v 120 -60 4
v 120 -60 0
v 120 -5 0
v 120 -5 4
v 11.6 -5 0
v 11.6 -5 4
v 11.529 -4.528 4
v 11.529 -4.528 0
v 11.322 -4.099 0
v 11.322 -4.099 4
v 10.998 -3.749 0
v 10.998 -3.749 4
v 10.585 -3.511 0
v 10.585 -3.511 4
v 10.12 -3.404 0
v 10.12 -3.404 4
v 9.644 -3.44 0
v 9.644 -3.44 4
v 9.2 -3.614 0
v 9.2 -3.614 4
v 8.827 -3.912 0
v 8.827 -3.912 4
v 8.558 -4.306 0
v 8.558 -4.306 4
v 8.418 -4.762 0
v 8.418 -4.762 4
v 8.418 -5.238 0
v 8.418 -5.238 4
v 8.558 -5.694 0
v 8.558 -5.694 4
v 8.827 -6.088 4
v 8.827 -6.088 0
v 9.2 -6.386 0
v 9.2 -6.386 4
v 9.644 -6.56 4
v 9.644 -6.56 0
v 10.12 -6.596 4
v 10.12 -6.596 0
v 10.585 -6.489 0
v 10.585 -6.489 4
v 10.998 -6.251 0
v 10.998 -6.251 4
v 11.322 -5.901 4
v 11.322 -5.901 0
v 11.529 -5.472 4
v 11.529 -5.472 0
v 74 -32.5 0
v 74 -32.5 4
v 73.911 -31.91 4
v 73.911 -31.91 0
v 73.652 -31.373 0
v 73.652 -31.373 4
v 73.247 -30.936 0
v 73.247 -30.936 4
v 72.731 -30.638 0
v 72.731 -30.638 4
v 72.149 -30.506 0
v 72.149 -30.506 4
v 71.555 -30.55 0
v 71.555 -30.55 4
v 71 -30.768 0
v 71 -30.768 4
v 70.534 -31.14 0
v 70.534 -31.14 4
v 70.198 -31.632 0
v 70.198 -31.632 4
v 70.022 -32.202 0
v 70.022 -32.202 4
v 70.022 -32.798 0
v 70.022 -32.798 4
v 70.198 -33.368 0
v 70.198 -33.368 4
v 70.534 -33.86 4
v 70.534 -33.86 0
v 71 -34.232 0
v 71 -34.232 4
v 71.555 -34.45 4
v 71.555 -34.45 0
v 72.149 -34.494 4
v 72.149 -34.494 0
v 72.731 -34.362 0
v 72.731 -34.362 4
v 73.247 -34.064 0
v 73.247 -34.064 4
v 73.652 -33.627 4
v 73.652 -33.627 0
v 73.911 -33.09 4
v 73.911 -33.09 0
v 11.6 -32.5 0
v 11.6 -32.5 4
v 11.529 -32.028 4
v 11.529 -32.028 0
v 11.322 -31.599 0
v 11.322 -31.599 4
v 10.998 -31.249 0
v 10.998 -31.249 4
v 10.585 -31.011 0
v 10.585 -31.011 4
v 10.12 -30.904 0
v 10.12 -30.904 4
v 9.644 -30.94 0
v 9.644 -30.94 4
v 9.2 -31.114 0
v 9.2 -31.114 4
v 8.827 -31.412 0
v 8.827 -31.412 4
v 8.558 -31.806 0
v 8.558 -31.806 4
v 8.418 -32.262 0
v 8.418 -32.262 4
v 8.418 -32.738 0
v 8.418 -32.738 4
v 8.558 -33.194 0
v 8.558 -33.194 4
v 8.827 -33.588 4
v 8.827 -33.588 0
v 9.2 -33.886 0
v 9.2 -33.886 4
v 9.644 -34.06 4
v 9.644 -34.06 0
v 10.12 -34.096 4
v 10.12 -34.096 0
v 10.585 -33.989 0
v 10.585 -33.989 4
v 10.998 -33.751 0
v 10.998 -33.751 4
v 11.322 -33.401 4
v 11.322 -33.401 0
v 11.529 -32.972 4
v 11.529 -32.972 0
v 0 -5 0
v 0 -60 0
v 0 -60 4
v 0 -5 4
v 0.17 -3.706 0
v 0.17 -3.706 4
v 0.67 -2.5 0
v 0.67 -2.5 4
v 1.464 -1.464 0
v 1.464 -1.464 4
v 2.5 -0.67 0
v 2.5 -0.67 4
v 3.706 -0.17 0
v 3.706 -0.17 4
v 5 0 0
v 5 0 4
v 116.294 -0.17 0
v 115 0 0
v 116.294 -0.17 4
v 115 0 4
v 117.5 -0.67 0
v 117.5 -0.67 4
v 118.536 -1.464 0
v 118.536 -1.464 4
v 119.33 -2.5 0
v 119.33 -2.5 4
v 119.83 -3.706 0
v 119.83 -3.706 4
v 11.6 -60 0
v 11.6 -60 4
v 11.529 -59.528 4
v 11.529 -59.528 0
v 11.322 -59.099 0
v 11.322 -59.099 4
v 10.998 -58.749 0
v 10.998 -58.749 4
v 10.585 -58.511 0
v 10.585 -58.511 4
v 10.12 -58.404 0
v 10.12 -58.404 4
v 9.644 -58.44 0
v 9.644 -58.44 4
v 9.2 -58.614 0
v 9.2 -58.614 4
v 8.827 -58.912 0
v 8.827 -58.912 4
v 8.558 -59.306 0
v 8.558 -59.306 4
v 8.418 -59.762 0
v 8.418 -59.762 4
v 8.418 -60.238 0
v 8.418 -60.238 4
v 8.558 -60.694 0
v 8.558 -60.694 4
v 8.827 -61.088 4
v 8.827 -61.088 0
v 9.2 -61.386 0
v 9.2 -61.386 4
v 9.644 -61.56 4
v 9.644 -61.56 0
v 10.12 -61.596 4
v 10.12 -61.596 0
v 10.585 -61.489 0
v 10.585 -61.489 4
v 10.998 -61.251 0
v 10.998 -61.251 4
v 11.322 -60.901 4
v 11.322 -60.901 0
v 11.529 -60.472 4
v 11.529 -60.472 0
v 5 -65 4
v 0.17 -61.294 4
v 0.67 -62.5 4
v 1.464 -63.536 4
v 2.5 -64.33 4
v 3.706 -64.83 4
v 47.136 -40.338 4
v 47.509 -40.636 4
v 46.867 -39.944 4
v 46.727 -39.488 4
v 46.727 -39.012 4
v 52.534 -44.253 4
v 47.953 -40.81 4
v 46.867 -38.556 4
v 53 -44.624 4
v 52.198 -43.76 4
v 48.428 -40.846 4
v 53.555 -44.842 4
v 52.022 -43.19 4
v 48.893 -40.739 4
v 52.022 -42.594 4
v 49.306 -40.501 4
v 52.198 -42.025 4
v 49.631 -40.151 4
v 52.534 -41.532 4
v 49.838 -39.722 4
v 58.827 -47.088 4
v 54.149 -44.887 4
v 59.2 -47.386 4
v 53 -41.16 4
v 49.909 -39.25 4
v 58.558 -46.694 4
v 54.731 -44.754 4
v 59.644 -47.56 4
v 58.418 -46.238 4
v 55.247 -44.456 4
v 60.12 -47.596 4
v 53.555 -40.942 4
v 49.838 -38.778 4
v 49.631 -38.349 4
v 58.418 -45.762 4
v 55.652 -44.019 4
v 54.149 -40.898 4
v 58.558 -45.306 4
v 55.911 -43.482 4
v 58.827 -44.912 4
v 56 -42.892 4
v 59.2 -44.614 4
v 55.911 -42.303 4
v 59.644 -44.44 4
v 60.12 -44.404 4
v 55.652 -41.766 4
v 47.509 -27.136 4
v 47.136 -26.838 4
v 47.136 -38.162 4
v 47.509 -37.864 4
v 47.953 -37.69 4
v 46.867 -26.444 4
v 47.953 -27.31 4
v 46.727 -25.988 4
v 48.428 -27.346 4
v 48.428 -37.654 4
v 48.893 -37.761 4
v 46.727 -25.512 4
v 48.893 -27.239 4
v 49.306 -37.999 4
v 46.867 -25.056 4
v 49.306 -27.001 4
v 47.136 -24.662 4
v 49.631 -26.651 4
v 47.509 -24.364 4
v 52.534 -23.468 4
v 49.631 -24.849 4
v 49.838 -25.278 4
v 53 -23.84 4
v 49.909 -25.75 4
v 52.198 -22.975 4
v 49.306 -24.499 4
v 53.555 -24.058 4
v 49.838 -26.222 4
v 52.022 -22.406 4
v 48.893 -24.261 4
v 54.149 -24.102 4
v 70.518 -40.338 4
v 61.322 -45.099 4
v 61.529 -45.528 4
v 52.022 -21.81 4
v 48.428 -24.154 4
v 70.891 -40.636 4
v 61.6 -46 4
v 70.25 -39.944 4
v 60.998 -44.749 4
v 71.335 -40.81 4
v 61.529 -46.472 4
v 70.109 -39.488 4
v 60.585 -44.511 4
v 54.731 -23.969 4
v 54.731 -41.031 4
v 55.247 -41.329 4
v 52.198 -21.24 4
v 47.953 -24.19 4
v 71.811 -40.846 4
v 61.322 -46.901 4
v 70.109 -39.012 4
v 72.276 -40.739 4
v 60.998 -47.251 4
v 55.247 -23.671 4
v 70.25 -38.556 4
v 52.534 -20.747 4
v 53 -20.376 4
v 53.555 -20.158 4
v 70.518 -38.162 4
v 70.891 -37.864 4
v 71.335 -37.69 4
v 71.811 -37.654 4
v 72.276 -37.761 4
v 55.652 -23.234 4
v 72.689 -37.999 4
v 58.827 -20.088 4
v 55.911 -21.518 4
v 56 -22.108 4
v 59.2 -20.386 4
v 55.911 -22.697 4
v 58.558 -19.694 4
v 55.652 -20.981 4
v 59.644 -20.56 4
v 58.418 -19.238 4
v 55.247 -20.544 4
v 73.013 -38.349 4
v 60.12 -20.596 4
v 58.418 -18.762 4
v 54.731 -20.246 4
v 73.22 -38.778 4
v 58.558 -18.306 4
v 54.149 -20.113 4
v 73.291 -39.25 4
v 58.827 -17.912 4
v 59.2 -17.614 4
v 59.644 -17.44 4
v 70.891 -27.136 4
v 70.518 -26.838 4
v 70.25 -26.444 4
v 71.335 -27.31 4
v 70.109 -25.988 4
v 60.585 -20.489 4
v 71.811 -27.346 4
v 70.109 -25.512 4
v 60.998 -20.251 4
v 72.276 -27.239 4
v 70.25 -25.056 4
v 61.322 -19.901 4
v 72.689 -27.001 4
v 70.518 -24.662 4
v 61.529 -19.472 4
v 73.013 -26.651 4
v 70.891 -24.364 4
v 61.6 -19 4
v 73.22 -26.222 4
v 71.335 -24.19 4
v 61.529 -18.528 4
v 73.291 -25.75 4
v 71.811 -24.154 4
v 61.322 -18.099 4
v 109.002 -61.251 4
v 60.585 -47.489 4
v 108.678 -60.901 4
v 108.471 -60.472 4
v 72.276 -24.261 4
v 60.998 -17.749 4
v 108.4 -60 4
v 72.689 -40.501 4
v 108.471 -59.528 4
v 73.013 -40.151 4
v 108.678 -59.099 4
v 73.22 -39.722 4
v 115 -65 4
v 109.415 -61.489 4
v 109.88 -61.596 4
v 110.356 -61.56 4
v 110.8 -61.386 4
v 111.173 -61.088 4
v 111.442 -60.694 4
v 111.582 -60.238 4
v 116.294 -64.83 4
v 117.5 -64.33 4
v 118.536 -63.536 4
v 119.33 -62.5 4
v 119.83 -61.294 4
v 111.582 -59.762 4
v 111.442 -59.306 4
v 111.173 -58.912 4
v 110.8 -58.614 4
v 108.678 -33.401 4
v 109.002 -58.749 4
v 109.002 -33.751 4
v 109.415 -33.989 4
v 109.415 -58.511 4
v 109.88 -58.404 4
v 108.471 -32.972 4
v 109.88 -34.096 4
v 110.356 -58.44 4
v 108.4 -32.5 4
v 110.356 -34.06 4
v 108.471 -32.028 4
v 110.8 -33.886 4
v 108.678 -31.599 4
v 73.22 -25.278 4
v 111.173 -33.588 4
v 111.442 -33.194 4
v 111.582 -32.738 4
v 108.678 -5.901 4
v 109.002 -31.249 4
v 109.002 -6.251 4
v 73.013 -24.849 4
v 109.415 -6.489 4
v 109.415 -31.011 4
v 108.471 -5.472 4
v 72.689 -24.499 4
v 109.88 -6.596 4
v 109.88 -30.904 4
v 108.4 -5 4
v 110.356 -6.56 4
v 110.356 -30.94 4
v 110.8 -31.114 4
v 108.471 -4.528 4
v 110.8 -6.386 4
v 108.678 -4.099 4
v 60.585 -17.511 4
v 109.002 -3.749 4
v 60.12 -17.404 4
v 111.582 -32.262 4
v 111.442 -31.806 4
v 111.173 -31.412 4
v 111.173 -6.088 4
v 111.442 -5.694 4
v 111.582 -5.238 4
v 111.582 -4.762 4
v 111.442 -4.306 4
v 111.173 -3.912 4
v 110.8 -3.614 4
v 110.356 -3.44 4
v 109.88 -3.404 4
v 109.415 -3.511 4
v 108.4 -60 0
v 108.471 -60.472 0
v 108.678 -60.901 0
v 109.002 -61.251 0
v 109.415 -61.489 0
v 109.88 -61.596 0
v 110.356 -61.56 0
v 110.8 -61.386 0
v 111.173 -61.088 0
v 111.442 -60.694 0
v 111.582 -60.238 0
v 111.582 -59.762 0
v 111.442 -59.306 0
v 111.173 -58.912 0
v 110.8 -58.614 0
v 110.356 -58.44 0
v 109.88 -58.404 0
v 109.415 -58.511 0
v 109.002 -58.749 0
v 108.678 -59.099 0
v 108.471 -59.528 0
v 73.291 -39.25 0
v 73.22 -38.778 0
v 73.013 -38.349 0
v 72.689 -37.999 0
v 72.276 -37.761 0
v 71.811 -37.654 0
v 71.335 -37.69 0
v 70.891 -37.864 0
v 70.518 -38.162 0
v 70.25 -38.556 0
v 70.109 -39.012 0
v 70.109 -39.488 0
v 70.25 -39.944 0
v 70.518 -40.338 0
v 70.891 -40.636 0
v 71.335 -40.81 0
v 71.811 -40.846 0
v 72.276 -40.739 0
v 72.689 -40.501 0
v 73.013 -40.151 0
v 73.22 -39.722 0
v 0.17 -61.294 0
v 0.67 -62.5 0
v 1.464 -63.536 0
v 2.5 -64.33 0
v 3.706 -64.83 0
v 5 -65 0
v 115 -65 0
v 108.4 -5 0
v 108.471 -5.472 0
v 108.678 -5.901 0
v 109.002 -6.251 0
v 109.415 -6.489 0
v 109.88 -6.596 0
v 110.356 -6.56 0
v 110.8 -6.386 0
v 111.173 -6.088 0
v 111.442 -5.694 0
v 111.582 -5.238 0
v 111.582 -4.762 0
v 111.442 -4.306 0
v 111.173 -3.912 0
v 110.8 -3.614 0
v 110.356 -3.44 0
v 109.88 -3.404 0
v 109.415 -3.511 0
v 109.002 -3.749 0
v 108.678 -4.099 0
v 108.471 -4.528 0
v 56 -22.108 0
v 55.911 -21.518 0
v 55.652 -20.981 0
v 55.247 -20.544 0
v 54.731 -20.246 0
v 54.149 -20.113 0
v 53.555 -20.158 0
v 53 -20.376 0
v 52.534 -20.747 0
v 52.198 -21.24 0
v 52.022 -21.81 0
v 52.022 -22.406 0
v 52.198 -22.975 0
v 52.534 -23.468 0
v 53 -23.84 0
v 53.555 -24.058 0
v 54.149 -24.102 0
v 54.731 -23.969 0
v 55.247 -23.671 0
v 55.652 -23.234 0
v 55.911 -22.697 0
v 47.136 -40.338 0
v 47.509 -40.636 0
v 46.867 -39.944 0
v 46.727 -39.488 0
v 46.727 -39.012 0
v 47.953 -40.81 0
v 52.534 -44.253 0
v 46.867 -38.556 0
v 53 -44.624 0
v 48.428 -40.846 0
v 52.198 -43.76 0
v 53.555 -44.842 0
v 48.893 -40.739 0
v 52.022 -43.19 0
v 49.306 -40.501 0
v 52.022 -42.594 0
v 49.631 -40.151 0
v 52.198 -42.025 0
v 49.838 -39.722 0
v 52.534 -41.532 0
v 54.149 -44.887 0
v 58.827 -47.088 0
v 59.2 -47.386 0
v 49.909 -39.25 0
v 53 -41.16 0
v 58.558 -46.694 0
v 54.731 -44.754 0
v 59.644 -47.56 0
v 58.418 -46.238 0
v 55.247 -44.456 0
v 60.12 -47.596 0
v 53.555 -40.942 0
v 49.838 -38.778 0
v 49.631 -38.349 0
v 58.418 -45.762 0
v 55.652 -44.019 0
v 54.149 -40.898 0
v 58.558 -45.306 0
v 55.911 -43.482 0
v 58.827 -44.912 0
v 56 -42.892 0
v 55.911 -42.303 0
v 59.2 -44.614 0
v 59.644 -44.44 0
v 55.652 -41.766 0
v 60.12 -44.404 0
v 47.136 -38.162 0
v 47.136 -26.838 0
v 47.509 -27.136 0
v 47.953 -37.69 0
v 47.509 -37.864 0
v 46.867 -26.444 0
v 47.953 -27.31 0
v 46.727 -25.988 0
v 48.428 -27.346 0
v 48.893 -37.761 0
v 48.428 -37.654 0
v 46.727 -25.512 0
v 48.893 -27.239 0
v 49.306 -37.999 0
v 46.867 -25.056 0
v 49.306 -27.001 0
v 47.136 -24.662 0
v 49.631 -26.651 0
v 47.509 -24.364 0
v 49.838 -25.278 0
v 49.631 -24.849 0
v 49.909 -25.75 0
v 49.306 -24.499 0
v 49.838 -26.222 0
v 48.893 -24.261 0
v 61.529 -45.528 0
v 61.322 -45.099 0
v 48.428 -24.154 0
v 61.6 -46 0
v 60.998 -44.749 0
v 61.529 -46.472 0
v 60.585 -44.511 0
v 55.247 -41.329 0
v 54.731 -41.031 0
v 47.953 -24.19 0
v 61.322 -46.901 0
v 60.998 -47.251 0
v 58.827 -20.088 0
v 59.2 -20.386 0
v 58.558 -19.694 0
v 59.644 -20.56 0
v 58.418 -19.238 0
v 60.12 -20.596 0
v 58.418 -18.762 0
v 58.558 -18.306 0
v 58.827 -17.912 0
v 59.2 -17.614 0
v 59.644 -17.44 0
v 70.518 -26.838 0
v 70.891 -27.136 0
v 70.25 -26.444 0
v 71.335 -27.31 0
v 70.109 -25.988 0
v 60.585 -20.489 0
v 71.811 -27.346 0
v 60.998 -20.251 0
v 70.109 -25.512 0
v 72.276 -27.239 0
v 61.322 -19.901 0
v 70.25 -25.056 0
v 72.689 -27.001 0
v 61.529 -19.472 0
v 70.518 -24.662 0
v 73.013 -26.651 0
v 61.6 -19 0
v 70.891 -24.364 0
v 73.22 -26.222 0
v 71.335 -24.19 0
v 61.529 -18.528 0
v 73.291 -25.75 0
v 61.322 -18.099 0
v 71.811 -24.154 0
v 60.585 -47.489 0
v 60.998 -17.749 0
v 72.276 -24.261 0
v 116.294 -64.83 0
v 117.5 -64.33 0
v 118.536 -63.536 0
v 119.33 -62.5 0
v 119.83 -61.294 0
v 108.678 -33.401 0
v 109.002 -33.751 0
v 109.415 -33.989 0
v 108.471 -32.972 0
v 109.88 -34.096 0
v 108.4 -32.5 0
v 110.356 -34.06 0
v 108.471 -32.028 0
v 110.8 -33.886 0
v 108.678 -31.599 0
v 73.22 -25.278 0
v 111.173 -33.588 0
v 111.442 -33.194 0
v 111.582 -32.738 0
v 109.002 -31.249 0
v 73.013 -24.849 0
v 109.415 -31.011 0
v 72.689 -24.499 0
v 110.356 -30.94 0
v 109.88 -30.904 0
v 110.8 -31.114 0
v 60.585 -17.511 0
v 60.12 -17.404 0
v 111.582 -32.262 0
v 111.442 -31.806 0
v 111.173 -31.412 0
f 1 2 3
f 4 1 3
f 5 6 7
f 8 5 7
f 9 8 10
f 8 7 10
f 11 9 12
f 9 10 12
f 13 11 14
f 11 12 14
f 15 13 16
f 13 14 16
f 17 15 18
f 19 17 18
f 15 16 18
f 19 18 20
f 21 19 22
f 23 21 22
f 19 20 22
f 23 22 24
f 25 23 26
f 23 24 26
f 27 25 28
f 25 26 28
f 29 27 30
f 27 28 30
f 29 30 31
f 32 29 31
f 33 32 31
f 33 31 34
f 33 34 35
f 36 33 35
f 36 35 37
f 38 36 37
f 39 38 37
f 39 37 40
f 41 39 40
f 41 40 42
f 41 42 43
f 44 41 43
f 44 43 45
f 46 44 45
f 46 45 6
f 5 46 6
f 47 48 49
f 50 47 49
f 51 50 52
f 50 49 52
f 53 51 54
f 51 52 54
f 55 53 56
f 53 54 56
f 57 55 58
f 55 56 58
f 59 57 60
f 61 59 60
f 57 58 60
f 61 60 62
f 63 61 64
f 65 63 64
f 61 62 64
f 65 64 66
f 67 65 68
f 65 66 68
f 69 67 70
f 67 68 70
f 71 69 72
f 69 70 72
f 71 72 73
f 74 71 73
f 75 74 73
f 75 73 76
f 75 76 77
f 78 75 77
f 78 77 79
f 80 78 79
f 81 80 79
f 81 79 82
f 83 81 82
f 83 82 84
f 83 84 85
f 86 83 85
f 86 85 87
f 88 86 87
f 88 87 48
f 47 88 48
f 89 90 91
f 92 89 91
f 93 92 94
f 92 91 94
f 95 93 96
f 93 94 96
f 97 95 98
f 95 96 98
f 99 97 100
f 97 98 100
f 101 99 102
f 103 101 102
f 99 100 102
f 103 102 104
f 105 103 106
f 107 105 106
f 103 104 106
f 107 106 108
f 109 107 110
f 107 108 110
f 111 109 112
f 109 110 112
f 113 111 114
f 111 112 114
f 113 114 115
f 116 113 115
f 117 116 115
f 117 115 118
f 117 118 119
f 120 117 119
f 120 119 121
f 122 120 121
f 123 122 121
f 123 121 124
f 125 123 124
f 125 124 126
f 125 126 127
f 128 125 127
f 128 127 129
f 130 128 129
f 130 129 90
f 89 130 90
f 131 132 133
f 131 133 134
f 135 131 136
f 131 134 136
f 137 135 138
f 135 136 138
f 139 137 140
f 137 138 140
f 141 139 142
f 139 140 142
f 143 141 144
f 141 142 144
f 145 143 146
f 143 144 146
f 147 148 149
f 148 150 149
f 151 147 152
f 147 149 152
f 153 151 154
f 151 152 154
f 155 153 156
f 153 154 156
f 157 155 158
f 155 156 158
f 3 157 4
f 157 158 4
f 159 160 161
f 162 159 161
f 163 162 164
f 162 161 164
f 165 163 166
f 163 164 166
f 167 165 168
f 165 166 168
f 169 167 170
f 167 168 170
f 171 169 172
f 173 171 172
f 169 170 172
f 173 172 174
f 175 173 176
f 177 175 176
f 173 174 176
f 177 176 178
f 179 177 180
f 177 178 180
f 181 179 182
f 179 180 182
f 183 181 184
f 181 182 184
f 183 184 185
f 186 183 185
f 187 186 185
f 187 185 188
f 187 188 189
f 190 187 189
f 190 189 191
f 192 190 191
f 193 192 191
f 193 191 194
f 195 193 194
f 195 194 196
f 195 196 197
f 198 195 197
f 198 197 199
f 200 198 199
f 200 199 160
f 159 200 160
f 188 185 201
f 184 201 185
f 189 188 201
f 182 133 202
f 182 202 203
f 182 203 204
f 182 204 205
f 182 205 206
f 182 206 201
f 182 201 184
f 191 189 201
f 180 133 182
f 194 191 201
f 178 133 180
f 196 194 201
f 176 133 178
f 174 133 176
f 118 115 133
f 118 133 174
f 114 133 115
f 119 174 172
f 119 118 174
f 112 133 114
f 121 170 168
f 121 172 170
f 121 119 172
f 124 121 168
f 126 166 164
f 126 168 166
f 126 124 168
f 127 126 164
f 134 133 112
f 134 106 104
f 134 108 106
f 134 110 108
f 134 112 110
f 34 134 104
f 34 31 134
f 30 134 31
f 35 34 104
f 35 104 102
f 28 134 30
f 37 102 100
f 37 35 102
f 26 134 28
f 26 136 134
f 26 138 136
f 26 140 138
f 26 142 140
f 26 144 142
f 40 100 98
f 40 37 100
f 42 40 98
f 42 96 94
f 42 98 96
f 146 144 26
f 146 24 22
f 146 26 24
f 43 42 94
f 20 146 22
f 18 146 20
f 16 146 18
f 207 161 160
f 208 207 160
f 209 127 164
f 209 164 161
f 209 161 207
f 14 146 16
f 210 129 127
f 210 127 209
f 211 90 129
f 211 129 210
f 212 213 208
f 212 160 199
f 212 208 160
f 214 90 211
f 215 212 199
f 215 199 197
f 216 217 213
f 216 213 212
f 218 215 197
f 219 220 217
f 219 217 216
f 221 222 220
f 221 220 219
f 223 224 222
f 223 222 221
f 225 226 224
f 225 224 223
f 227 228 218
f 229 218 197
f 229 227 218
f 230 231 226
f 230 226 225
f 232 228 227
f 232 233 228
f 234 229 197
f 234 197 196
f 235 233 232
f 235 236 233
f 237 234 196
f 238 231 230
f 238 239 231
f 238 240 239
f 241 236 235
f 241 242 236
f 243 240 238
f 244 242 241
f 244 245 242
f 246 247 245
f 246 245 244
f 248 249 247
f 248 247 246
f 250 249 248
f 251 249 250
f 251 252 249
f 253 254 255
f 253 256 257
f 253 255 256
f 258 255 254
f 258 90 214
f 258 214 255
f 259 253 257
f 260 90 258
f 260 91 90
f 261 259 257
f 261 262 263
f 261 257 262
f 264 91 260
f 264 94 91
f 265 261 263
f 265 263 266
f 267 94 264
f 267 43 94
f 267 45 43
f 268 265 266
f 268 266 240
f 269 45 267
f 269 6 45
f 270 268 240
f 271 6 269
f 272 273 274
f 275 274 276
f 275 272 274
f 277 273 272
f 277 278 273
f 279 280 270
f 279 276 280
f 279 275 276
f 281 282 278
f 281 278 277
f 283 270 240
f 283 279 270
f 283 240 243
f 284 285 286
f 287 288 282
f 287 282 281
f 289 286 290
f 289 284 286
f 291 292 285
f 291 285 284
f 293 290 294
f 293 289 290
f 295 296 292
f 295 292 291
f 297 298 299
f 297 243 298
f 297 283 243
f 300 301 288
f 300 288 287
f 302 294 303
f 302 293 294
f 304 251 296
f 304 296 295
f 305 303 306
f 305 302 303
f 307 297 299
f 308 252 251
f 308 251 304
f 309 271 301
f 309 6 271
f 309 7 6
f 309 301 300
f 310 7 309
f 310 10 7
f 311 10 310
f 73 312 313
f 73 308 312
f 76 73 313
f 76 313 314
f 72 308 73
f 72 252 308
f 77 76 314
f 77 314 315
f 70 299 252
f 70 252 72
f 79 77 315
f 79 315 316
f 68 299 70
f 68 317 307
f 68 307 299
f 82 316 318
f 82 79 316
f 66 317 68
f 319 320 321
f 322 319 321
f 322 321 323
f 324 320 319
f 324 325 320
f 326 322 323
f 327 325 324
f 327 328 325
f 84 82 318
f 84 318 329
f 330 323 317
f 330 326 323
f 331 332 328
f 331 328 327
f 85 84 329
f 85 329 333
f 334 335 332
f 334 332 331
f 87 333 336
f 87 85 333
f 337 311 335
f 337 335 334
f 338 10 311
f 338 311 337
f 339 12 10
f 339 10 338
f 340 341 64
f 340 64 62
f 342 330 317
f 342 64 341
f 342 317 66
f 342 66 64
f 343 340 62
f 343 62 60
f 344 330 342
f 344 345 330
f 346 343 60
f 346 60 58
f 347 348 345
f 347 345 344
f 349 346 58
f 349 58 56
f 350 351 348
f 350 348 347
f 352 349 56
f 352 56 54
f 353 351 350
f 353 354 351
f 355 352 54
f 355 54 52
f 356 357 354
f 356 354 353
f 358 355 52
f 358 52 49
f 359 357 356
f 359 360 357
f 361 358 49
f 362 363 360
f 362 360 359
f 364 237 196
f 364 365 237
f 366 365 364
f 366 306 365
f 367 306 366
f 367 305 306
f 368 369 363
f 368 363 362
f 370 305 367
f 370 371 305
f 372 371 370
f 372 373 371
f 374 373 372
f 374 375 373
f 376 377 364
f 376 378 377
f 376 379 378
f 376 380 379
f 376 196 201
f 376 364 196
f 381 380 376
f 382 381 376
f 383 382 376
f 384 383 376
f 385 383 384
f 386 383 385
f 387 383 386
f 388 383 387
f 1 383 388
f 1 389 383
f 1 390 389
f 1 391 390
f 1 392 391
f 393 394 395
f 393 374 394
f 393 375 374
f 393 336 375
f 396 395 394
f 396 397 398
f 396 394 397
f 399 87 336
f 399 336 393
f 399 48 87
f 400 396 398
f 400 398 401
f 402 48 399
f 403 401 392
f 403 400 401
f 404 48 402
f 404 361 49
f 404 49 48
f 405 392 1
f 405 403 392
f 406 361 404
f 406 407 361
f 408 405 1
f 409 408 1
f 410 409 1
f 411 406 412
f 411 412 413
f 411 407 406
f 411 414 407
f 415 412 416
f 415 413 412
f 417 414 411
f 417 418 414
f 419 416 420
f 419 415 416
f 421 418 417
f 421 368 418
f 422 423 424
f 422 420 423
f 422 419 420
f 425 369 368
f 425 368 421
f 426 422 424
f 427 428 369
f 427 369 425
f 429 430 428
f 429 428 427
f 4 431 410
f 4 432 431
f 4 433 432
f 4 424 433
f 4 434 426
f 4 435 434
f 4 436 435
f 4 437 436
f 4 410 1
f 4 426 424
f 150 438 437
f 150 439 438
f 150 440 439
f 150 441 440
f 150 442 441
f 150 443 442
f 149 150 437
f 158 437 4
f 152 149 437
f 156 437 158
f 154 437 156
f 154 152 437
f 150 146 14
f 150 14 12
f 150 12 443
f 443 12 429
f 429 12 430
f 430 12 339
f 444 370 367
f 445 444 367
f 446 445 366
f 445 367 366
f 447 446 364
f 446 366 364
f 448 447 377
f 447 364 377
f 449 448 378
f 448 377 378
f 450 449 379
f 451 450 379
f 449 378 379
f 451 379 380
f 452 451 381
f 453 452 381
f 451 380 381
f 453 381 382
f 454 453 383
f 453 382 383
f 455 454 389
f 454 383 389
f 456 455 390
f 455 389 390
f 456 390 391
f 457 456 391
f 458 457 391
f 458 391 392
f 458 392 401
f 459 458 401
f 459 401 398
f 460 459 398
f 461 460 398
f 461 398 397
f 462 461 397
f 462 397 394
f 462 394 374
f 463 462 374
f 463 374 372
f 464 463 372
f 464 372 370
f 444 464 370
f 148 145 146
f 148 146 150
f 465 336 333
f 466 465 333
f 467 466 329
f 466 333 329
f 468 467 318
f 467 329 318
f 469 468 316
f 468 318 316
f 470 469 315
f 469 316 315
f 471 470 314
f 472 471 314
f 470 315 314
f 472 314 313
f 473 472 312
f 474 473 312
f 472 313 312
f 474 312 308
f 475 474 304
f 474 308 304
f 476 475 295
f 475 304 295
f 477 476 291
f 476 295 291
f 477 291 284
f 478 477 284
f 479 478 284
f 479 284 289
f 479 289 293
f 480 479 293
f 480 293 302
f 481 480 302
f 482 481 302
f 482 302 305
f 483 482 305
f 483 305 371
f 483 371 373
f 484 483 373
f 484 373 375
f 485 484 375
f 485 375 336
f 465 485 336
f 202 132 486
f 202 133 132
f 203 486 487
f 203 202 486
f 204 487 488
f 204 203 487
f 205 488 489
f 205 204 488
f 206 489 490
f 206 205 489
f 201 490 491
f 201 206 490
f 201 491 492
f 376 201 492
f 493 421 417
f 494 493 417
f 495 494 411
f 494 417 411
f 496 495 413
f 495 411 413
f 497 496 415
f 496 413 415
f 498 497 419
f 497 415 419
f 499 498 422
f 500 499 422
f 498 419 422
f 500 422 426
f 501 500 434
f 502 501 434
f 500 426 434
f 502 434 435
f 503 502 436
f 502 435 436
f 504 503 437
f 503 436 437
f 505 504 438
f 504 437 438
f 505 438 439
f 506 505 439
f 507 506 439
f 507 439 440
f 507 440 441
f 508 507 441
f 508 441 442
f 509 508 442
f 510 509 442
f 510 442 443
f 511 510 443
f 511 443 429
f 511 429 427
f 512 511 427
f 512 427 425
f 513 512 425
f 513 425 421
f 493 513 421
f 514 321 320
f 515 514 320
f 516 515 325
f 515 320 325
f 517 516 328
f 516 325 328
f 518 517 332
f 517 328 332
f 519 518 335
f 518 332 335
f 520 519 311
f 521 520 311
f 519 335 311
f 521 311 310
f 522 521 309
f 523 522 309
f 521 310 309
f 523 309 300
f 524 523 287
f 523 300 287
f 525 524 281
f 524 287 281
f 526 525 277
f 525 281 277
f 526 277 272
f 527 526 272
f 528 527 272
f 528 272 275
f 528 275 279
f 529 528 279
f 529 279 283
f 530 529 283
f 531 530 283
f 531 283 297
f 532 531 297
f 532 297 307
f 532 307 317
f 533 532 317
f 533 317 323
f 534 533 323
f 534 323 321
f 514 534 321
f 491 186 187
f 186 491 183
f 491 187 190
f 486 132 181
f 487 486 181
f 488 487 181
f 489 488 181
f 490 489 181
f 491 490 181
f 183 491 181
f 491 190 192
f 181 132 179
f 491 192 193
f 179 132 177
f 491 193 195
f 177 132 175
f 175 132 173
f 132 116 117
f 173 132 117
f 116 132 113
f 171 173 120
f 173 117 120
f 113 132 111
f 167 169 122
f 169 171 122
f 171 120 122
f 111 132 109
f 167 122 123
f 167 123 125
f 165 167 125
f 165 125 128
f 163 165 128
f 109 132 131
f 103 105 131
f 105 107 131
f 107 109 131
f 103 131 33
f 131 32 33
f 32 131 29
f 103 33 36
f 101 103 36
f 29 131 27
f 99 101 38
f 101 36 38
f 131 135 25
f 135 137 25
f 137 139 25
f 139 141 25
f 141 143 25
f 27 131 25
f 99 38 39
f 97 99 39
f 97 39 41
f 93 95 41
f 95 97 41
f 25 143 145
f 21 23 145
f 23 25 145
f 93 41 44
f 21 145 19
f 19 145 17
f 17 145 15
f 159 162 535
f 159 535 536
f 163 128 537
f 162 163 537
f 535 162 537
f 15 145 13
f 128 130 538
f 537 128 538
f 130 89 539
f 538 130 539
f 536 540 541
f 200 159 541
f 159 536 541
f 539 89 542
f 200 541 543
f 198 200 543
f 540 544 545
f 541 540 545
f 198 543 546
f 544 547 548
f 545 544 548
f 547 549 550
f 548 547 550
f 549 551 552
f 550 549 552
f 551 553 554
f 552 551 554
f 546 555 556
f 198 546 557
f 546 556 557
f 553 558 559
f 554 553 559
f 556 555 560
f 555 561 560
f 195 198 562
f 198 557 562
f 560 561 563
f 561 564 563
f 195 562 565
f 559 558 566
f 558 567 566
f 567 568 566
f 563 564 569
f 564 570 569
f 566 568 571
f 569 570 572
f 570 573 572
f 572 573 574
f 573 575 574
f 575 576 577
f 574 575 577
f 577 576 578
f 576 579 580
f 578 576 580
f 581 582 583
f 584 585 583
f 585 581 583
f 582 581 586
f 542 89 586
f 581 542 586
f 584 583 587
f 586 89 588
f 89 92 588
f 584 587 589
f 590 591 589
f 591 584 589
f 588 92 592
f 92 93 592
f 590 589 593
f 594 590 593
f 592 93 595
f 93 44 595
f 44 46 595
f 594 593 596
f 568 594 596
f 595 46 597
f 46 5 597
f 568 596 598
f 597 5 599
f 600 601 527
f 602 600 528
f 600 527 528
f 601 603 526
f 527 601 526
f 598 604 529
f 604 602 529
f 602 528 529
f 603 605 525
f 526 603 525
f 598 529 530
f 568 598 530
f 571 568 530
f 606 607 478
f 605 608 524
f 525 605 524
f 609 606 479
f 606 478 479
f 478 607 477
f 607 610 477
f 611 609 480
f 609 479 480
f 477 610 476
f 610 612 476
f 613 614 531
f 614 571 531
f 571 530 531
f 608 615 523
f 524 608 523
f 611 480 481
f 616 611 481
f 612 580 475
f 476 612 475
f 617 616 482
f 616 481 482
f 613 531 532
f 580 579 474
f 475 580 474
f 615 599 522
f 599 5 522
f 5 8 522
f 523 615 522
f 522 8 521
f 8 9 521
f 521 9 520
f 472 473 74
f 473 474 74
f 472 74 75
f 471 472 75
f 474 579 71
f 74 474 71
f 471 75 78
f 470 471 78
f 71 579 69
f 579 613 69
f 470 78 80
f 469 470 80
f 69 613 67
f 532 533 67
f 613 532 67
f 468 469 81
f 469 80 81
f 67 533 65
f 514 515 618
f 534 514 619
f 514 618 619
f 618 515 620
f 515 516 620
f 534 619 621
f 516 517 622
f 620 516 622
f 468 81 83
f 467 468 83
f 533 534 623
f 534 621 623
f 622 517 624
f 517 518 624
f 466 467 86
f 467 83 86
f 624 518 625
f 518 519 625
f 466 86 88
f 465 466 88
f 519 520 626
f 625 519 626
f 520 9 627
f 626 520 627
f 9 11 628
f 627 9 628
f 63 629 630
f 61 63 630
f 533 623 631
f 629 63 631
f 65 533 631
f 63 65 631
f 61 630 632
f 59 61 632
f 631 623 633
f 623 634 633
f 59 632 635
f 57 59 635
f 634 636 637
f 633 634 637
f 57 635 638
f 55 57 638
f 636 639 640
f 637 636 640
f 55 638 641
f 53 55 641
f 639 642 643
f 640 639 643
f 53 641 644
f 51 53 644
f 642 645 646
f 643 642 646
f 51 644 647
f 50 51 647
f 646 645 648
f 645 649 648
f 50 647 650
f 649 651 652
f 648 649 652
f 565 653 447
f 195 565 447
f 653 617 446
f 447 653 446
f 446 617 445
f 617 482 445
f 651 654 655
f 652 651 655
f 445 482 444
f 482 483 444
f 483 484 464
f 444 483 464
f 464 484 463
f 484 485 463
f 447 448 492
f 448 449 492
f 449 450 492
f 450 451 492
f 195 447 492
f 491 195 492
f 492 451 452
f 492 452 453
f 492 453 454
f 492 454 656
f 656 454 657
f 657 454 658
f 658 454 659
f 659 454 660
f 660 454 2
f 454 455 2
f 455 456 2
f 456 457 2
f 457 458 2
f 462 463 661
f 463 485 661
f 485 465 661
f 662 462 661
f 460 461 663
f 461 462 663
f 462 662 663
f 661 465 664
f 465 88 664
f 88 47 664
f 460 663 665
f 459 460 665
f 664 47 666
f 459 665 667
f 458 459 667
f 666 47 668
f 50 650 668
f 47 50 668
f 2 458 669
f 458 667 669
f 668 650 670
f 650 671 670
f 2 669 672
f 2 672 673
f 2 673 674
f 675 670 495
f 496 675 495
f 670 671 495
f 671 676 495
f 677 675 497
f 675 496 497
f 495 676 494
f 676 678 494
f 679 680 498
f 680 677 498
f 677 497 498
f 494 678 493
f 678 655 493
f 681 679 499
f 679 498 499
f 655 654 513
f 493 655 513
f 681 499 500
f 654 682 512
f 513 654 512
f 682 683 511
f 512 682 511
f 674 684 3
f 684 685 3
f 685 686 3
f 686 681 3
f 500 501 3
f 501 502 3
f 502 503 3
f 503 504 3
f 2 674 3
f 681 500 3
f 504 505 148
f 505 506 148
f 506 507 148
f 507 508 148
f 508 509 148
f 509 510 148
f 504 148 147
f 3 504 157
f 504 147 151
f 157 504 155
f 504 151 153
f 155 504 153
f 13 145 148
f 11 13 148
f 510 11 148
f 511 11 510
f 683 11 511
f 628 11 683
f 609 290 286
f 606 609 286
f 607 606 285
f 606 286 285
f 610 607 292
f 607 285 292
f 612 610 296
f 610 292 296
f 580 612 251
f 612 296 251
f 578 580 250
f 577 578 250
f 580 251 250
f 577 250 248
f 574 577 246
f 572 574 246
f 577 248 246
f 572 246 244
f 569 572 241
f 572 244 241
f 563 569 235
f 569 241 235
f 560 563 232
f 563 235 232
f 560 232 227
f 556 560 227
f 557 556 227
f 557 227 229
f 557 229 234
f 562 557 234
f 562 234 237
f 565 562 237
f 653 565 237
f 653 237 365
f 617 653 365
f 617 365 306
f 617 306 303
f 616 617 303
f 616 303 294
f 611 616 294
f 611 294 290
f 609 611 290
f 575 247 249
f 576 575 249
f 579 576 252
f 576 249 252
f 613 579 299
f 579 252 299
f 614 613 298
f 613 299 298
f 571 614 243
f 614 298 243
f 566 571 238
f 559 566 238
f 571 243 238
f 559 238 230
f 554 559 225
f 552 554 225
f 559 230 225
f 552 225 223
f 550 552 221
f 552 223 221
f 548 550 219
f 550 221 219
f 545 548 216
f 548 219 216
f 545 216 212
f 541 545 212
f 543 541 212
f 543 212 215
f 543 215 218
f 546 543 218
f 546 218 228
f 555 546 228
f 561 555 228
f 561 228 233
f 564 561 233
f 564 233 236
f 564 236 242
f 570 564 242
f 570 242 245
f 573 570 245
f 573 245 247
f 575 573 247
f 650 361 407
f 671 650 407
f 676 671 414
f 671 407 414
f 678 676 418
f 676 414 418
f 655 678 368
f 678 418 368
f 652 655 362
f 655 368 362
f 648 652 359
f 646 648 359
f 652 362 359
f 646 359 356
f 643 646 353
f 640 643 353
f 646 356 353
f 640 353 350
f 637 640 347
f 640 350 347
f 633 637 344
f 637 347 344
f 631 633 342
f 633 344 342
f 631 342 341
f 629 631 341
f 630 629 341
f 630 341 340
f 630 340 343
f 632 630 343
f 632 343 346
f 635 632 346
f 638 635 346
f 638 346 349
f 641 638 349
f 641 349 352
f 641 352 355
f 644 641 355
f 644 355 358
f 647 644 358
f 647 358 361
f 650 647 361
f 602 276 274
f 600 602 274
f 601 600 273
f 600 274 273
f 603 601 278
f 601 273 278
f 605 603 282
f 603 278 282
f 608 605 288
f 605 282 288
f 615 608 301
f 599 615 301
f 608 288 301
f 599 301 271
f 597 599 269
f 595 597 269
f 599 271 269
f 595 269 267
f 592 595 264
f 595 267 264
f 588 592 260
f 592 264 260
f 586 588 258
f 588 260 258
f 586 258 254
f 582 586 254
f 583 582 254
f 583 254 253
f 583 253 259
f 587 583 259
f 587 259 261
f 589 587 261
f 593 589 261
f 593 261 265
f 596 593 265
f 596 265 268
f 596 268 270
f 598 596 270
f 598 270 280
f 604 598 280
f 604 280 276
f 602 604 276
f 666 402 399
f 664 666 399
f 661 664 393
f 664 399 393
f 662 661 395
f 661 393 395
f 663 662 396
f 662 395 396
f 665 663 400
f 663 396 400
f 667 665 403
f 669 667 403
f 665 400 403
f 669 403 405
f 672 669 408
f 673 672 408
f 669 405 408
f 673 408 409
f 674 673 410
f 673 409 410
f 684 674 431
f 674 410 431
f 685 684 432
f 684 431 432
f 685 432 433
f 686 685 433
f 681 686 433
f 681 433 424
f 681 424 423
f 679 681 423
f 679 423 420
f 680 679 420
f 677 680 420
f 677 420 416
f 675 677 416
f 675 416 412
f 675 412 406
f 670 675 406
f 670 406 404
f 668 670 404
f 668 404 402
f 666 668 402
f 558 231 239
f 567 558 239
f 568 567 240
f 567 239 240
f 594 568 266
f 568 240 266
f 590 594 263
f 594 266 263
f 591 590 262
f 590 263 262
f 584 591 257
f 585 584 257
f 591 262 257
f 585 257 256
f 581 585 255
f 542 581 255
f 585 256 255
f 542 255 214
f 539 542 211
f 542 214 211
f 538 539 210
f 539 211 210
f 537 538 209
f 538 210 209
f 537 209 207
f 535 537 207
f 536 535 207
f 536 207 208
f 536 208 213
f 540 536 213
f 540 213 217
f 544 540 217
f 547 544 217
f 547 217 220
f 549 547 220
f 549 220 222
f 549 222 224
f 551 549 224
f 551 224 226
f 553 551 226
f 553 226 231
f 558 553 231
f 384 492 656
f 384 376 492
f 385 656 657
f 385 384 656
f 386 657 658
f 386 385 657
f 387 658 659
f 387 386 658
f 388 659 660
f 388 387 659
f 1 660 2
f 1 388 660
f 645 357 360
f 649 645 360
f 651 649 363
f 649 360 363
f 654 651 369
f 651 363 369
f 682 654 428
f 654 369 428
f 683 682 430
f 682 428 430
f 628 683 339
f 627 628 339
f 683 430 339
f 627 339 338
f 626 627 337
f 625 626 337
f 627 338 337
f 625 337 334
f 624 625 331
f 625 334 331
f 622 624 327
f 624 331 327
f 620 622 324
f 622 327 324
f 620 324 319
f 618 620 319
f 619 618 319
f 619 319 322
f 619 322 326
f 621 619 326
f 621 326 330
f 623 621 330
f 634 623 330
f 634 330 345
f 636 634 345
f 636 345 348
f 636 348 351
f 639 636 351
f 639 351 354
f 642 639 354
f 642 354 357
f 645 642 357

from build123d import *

# Parameters (mm, degrees)
SKETCH_1_W          = 120
SKETCH_1_H          = 65
EXTRUDE_1_DEPTH     = 4
SKETCH_2_R          = 1.6
CUT_EXTRUDE_1_DEPTH = 137.53204752
FILLET_1_R          = 5
SKETCH_4_R          = 2
SKETCH_4_R_2        = 1.6
CUT_EXTRUDE_3_DEPTH = 12.5


with BuildPart() as part:
    # 草图1 → 凸台-拉伸1 (new body)
    with BuildSketch(Plane.XY):
        with Locations((60, -32.5)):
            Rectangle(SKETCH_1_W, SKETCH_1_H)
    extrude(amount=EXTRUDE_1_DEPTH)

    # 草图2 → 切除-拉伸1 (cut, through all)
    with BuildSketch(Plane.XY.offset(4)):
        with Locations((10, -5)):
            Circle(SKETCH_2_R)
        with Locations((10, -32.5)):
            Circle(SKETCH_2_R)
        with Locations((10, -60)):
            Circle(SKETCH_2_R)
        with Locations(Location((110, -60, 0), (0, 0, 180))):
            Circle(SKETCH_2_R)
        with Locations(Location((110, -32.5, 0), (0, 0, 180))):
            Circle(SKETCH_2_R)
        with Locations(Location((110, -5, 0), (0, 0, 180))):
            Circle(SKETCH_2_R)
    extrude(amount=-CUT_EXTRUDE_1_DEPTH, mode=Mode.SUBTRACT)

    # 圆角1
    fillet_1_edges = [part.edges().sort_by_distance(p)[0] for p in [
        (0, 0, 2),
        (120, 0, 2),
        (120, -65, 2),
        (0, -65, 2),
    ]]
    fillet(fillet_1_edges, radius=FILLET_1_R)

    # 草图4 → 切除-拉伸3 (cut)
    with BuildSketch(Plane.XY.offset(4)):
        with Locations((72, -32.5)):
            Circle(SKETCH_4_R)
        with Locations((60, -19)):
            Circle(SKETCH_4_R_2)
        with Locations((71.691342951, -25.75)):
            Circle(SKETCH_4_R_2)
        with Locations((71.691342951, -39.25)):
            Circle(SKETCH_4_R_2)
        with Locations((60, -46)):
            Circle(SKETCH_4_R_2)
        with Locations((48.308657049, -39.25)):
            Circle(SKETCH_4_R_2)
        with Locations((48.308657049, -25.75)):
            Circle(SKETCH_4_R_2)
        with Locations((54, -42.892304845)):
            Circle(SKETCH_4_R)
        with Locations((54, -22.107695155)):
            Circle(SKETCH_4_R)
    extrude(amount=-CUT_EXTRUDE_3_DEPTH, mode=Mode.SUBTRACT)


solid = part.part
